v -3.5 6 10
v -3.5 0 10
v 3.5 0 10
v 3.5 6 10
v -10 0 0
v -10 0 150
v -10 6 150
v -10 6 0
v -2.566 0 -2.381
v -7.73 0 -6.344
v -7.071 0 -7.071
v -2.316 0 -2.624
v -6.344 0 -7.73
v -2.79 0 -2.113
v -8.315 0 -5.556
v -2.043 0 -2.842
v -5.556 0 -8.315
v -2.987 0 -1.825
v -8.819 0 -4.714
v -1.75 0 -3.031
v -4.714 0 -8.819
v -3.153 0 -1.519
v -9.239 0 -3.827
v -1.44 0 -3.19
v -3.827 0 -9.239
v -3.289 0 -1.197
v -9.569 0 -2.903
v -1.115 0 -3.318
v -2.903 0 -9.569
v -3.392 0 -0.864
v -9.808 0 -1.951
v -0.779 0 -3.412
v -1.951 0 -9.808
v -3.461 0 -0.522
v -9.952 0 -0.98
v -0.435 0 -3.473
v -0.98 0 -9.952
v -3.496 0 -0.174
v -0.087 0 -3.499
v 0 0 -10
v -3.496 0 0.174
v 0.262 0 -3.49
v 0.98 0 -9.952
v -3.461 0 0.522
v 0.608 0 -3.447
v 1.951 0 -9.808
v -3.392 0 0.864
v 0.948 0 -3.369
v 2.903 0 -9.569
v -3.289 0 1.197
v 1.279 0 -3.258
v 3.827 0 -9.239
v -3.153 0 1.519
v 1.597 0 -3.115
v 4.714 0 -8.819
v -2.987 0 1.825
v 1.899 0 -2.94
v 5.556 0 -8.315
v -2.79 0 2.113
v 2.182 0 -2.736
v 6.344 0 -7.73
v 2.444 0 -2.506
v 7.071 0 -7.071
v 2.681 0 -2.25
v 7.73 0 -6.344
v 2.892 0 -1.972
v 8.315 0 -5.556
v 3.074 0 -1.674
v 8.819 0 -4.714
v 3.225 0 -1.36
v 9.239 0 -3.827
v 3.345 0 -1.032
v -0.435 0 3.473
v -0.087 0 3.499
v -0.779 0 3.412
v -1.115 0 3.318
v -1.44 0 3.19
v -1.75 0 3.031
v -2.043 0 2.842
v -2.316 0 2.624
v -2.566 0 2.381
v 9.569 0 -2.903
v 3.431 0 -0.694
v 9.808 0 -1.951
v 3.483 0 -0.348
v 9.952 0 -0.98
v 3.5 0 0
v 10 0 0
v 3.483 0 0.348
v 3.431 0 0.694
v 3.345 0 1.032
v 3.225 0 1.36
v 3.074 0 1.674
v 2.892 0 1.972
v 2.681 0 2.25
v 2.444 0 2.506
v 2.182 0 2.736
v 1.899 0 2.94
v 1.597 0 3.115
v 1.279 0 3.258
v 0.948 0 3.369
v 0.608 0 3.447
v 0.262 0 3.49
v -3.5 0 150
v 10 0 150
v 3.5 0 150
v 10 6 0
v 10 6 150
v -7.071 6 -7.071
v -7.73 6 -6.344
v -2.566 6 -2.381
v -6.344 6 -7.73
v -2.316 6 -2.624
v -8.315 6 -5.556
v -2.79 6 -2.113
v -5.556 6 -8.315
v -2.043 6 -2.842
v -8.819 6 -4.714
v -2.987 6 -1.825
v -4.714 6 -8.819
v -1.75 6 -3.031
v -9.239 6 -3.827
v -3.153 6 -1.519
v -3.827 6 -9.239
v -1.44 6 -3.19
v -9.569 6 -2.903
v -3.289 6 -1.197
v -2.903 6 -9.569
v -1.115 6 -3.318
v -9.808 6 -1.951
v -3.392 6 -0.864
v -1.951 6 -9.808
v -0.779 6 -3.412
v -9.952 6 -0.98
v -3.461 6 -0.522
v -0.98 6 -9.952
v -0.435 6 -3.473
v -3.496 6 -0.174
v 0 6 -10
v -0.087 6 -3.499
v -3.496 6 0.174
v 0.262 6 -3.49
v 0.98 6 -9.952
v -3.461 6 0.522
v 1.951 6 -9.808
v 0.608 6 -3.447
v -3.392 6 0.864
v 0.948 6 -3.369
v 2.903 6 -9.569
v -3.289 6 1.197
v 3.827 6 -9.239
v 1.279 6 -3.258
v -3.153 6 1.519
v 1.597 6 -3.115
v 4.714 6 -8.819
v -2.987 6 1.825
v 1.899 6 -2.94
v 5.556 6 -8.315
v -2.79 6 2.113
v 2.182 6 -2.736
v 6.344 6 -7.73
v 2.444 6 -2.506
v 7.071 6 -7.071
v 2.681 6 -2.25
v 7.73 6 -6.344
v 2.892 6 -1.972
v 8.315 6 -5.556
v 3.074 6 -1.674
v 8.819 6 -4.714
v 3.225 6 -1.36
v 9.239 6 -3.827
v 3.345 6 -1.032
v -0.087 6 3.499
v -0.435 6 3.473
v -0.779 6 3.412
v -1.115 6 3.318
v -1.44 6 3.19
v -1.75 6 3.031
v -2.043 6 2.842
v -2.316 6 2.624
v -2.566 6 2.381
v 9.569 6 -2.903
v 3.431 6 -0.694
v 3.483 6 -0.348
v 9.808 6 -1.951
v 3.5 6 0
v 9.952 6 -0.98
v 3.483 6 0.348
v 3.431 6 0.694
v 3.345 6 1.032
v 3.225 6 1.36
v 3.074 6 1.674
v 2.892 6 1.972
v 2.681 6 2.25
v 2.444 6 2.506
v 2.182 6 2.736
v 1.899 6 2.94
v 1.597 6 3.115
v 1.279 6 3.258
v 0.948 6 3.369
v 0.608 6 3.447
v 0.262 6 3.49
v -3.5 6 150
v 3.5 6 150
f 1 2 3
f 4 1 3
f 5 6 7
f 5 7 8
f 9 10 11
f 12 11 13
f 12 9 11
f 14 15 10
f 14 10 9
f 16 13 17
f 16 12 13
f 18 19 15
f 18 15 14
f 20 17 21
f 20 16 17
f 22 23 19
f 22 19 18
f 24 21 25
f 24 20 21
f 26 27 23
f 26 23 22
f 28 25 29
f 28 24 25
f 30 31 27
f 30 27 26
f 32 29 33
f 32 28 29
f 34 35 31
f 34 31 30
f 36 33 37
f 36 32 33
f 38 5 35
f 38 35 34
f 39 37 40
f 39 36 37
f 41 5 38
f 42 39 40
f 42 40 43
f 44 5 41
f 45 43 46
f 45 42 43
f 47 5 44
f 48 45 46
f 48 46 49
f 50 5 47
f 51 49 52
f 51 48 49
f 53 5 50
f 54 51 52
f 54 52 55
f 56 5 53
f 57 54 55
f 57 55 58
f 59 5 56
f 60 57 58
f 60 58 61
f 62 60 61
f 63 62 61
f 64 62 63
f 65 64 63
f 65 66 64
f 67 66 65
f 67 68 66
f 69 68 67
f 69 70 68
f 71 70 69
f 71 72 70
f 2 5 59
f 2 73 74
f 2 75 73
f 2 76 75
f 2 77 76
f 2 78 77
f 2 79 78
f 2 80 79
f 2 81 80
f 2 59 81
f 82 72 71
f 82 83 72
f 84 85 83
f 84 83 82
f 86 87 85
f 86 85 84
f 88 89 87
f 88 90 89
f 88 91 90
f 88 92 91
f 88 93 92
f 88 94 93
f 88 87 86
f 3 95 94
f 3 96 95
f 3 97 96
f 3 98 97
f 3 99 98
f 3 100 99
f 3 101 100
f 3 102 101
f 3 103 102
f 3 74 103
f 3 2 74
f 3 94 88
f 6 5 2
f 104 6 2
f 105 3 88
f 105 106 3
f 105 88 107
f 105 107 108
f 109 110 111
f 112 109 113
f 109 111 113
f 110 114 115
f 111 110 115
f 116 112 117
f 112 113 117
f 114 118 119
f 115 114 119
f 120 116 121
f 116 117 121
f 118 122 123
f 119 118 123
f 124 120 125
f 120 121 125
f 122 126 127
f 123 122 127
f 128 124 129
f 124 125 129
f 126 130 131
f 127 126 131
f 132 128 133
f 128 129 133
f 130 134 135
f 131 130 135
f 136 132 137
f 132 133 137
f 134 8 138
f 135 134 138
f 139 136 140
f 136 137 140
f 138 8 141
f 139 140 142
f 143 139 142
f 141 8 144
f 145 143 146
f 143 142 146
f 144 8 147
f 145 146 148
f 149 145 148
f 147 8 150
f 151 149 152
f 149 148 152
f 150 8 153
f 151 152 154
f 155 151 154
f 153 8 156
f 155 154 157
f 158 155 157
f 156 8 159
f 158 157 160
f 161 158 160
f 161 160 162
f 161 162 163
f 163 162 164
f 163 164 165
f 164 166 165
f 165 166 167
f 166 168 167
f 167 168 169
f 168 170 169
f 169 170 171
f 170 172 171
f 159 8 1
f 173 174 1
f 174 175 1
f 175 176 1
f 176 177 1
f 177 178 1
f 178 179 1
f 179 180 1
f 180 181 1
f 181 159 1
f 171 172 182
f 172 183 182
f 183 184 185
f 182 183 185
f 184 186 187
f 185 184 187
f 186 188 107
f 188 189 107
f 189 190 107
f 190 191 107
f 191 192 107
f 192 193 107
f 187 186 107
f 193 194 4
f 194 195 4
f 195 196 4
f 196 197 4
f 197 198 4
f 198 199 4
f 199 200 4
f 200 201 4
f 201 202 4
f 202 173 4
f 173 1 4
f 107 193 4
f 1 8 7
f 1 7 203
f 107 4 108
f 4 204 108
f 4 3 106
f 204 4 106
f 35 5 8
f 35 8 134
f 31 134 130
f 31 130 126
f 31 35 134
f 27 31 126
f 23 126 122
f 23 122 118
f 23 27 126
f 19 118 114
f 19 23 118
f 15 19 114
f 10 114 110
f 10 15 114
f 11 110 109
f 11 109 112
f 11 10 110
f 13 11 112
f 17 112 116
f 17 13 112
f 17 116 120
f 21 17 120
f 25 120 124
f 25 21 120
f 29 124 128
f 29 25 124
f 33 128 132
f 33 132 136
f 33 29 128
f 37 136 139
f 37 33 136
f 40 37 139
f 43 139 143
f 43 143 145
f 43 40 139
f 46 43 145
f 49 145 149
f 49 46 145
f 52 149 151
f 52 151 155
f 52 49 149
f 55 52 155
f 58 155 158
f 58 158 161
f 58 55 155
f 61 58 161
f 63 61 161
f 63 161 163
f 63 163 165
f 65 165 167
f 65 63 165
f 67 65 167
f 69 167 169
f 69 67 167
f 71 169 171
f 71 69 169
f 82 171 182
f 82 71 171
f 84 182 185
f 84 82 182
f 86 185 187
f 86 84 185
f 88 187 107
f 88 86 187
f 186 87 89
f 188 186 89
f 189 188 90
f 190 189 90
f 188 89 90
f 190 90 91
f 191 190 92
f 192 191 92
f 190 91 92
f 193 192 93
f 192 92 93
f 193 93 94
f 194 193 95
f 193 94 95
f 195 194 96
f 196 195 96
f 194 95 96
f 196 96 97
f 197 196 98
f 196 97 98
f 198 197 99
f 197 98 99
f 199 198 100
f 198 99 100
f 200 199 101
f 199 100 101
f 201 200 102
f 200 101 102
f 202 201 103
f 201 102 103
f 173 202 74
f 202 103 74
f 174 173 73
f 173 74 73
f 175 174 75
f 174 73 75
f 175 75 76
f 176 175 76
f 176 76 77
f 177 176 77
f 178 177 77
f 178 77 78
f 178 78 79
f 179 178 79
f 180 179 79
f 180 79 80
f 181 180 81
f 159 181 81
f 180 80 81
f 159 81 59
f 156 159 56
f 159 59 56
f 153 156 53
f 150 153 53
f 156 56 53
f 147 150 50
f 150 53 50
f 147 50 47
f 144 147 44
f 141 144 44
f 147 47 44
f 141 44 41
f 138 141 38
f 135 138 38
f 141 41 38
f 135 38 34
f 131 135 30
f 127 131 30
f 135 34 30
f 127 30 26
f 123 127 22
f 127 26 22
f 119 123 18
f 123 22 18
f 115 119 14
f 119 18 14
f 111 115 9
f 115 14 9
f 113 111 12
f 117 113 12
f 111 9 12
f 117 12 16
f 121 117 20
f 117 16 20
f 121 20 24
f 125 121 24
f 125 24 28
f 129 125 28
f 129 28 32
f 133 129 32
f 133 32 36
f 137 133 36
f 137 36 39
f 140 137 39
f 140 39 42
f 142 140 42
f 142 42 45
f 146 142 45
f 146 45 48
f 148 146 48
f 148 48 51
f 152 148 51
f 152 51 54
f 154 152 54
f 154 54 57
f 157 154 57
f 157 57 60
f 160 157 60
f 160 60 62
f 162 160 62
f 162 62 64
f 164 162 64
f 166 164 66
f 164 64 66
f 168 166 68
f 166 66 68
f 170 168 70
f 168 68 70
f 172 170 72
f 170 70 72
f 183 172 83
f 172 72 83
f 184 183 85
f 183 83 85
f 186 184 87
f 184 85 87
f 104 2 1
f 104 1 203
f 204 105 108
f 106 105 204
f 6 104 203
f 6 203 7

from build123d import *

# Parameters (mm, degrees)
F0_R     = 3.5
F1_DEPTH = 6
F2_W     = 7
F2_H     = 150
F3_DEPTH = 25


with BuildPart() as f1:
    # F0 (on Front) → F1 (new body)
    with BuildSketch(Plane.XZ):
        with BuildLine():
            Line((-10, 150), (-10, 0))
            ThreePointArc((-10, 0), (0, -10), (10, 0))
            Line((10, 0), (10, 150))
            Line((10, 150), (-10, 150))
        make_face()
        Circle(F0_R, mode=Mode.SUBTRACT)
    extrude(amount=-F1_DEPTH)

    # F2 (on face) → F3 (cut)
    with BuildSketch(Plane.XZ):
        with Locations((0, 85)):
            Rectangle(F2_W, F2_H)
    extrude(amount=-F3_DEPTH, mode=Mode.SUBTRACT)


solid = f1.part
